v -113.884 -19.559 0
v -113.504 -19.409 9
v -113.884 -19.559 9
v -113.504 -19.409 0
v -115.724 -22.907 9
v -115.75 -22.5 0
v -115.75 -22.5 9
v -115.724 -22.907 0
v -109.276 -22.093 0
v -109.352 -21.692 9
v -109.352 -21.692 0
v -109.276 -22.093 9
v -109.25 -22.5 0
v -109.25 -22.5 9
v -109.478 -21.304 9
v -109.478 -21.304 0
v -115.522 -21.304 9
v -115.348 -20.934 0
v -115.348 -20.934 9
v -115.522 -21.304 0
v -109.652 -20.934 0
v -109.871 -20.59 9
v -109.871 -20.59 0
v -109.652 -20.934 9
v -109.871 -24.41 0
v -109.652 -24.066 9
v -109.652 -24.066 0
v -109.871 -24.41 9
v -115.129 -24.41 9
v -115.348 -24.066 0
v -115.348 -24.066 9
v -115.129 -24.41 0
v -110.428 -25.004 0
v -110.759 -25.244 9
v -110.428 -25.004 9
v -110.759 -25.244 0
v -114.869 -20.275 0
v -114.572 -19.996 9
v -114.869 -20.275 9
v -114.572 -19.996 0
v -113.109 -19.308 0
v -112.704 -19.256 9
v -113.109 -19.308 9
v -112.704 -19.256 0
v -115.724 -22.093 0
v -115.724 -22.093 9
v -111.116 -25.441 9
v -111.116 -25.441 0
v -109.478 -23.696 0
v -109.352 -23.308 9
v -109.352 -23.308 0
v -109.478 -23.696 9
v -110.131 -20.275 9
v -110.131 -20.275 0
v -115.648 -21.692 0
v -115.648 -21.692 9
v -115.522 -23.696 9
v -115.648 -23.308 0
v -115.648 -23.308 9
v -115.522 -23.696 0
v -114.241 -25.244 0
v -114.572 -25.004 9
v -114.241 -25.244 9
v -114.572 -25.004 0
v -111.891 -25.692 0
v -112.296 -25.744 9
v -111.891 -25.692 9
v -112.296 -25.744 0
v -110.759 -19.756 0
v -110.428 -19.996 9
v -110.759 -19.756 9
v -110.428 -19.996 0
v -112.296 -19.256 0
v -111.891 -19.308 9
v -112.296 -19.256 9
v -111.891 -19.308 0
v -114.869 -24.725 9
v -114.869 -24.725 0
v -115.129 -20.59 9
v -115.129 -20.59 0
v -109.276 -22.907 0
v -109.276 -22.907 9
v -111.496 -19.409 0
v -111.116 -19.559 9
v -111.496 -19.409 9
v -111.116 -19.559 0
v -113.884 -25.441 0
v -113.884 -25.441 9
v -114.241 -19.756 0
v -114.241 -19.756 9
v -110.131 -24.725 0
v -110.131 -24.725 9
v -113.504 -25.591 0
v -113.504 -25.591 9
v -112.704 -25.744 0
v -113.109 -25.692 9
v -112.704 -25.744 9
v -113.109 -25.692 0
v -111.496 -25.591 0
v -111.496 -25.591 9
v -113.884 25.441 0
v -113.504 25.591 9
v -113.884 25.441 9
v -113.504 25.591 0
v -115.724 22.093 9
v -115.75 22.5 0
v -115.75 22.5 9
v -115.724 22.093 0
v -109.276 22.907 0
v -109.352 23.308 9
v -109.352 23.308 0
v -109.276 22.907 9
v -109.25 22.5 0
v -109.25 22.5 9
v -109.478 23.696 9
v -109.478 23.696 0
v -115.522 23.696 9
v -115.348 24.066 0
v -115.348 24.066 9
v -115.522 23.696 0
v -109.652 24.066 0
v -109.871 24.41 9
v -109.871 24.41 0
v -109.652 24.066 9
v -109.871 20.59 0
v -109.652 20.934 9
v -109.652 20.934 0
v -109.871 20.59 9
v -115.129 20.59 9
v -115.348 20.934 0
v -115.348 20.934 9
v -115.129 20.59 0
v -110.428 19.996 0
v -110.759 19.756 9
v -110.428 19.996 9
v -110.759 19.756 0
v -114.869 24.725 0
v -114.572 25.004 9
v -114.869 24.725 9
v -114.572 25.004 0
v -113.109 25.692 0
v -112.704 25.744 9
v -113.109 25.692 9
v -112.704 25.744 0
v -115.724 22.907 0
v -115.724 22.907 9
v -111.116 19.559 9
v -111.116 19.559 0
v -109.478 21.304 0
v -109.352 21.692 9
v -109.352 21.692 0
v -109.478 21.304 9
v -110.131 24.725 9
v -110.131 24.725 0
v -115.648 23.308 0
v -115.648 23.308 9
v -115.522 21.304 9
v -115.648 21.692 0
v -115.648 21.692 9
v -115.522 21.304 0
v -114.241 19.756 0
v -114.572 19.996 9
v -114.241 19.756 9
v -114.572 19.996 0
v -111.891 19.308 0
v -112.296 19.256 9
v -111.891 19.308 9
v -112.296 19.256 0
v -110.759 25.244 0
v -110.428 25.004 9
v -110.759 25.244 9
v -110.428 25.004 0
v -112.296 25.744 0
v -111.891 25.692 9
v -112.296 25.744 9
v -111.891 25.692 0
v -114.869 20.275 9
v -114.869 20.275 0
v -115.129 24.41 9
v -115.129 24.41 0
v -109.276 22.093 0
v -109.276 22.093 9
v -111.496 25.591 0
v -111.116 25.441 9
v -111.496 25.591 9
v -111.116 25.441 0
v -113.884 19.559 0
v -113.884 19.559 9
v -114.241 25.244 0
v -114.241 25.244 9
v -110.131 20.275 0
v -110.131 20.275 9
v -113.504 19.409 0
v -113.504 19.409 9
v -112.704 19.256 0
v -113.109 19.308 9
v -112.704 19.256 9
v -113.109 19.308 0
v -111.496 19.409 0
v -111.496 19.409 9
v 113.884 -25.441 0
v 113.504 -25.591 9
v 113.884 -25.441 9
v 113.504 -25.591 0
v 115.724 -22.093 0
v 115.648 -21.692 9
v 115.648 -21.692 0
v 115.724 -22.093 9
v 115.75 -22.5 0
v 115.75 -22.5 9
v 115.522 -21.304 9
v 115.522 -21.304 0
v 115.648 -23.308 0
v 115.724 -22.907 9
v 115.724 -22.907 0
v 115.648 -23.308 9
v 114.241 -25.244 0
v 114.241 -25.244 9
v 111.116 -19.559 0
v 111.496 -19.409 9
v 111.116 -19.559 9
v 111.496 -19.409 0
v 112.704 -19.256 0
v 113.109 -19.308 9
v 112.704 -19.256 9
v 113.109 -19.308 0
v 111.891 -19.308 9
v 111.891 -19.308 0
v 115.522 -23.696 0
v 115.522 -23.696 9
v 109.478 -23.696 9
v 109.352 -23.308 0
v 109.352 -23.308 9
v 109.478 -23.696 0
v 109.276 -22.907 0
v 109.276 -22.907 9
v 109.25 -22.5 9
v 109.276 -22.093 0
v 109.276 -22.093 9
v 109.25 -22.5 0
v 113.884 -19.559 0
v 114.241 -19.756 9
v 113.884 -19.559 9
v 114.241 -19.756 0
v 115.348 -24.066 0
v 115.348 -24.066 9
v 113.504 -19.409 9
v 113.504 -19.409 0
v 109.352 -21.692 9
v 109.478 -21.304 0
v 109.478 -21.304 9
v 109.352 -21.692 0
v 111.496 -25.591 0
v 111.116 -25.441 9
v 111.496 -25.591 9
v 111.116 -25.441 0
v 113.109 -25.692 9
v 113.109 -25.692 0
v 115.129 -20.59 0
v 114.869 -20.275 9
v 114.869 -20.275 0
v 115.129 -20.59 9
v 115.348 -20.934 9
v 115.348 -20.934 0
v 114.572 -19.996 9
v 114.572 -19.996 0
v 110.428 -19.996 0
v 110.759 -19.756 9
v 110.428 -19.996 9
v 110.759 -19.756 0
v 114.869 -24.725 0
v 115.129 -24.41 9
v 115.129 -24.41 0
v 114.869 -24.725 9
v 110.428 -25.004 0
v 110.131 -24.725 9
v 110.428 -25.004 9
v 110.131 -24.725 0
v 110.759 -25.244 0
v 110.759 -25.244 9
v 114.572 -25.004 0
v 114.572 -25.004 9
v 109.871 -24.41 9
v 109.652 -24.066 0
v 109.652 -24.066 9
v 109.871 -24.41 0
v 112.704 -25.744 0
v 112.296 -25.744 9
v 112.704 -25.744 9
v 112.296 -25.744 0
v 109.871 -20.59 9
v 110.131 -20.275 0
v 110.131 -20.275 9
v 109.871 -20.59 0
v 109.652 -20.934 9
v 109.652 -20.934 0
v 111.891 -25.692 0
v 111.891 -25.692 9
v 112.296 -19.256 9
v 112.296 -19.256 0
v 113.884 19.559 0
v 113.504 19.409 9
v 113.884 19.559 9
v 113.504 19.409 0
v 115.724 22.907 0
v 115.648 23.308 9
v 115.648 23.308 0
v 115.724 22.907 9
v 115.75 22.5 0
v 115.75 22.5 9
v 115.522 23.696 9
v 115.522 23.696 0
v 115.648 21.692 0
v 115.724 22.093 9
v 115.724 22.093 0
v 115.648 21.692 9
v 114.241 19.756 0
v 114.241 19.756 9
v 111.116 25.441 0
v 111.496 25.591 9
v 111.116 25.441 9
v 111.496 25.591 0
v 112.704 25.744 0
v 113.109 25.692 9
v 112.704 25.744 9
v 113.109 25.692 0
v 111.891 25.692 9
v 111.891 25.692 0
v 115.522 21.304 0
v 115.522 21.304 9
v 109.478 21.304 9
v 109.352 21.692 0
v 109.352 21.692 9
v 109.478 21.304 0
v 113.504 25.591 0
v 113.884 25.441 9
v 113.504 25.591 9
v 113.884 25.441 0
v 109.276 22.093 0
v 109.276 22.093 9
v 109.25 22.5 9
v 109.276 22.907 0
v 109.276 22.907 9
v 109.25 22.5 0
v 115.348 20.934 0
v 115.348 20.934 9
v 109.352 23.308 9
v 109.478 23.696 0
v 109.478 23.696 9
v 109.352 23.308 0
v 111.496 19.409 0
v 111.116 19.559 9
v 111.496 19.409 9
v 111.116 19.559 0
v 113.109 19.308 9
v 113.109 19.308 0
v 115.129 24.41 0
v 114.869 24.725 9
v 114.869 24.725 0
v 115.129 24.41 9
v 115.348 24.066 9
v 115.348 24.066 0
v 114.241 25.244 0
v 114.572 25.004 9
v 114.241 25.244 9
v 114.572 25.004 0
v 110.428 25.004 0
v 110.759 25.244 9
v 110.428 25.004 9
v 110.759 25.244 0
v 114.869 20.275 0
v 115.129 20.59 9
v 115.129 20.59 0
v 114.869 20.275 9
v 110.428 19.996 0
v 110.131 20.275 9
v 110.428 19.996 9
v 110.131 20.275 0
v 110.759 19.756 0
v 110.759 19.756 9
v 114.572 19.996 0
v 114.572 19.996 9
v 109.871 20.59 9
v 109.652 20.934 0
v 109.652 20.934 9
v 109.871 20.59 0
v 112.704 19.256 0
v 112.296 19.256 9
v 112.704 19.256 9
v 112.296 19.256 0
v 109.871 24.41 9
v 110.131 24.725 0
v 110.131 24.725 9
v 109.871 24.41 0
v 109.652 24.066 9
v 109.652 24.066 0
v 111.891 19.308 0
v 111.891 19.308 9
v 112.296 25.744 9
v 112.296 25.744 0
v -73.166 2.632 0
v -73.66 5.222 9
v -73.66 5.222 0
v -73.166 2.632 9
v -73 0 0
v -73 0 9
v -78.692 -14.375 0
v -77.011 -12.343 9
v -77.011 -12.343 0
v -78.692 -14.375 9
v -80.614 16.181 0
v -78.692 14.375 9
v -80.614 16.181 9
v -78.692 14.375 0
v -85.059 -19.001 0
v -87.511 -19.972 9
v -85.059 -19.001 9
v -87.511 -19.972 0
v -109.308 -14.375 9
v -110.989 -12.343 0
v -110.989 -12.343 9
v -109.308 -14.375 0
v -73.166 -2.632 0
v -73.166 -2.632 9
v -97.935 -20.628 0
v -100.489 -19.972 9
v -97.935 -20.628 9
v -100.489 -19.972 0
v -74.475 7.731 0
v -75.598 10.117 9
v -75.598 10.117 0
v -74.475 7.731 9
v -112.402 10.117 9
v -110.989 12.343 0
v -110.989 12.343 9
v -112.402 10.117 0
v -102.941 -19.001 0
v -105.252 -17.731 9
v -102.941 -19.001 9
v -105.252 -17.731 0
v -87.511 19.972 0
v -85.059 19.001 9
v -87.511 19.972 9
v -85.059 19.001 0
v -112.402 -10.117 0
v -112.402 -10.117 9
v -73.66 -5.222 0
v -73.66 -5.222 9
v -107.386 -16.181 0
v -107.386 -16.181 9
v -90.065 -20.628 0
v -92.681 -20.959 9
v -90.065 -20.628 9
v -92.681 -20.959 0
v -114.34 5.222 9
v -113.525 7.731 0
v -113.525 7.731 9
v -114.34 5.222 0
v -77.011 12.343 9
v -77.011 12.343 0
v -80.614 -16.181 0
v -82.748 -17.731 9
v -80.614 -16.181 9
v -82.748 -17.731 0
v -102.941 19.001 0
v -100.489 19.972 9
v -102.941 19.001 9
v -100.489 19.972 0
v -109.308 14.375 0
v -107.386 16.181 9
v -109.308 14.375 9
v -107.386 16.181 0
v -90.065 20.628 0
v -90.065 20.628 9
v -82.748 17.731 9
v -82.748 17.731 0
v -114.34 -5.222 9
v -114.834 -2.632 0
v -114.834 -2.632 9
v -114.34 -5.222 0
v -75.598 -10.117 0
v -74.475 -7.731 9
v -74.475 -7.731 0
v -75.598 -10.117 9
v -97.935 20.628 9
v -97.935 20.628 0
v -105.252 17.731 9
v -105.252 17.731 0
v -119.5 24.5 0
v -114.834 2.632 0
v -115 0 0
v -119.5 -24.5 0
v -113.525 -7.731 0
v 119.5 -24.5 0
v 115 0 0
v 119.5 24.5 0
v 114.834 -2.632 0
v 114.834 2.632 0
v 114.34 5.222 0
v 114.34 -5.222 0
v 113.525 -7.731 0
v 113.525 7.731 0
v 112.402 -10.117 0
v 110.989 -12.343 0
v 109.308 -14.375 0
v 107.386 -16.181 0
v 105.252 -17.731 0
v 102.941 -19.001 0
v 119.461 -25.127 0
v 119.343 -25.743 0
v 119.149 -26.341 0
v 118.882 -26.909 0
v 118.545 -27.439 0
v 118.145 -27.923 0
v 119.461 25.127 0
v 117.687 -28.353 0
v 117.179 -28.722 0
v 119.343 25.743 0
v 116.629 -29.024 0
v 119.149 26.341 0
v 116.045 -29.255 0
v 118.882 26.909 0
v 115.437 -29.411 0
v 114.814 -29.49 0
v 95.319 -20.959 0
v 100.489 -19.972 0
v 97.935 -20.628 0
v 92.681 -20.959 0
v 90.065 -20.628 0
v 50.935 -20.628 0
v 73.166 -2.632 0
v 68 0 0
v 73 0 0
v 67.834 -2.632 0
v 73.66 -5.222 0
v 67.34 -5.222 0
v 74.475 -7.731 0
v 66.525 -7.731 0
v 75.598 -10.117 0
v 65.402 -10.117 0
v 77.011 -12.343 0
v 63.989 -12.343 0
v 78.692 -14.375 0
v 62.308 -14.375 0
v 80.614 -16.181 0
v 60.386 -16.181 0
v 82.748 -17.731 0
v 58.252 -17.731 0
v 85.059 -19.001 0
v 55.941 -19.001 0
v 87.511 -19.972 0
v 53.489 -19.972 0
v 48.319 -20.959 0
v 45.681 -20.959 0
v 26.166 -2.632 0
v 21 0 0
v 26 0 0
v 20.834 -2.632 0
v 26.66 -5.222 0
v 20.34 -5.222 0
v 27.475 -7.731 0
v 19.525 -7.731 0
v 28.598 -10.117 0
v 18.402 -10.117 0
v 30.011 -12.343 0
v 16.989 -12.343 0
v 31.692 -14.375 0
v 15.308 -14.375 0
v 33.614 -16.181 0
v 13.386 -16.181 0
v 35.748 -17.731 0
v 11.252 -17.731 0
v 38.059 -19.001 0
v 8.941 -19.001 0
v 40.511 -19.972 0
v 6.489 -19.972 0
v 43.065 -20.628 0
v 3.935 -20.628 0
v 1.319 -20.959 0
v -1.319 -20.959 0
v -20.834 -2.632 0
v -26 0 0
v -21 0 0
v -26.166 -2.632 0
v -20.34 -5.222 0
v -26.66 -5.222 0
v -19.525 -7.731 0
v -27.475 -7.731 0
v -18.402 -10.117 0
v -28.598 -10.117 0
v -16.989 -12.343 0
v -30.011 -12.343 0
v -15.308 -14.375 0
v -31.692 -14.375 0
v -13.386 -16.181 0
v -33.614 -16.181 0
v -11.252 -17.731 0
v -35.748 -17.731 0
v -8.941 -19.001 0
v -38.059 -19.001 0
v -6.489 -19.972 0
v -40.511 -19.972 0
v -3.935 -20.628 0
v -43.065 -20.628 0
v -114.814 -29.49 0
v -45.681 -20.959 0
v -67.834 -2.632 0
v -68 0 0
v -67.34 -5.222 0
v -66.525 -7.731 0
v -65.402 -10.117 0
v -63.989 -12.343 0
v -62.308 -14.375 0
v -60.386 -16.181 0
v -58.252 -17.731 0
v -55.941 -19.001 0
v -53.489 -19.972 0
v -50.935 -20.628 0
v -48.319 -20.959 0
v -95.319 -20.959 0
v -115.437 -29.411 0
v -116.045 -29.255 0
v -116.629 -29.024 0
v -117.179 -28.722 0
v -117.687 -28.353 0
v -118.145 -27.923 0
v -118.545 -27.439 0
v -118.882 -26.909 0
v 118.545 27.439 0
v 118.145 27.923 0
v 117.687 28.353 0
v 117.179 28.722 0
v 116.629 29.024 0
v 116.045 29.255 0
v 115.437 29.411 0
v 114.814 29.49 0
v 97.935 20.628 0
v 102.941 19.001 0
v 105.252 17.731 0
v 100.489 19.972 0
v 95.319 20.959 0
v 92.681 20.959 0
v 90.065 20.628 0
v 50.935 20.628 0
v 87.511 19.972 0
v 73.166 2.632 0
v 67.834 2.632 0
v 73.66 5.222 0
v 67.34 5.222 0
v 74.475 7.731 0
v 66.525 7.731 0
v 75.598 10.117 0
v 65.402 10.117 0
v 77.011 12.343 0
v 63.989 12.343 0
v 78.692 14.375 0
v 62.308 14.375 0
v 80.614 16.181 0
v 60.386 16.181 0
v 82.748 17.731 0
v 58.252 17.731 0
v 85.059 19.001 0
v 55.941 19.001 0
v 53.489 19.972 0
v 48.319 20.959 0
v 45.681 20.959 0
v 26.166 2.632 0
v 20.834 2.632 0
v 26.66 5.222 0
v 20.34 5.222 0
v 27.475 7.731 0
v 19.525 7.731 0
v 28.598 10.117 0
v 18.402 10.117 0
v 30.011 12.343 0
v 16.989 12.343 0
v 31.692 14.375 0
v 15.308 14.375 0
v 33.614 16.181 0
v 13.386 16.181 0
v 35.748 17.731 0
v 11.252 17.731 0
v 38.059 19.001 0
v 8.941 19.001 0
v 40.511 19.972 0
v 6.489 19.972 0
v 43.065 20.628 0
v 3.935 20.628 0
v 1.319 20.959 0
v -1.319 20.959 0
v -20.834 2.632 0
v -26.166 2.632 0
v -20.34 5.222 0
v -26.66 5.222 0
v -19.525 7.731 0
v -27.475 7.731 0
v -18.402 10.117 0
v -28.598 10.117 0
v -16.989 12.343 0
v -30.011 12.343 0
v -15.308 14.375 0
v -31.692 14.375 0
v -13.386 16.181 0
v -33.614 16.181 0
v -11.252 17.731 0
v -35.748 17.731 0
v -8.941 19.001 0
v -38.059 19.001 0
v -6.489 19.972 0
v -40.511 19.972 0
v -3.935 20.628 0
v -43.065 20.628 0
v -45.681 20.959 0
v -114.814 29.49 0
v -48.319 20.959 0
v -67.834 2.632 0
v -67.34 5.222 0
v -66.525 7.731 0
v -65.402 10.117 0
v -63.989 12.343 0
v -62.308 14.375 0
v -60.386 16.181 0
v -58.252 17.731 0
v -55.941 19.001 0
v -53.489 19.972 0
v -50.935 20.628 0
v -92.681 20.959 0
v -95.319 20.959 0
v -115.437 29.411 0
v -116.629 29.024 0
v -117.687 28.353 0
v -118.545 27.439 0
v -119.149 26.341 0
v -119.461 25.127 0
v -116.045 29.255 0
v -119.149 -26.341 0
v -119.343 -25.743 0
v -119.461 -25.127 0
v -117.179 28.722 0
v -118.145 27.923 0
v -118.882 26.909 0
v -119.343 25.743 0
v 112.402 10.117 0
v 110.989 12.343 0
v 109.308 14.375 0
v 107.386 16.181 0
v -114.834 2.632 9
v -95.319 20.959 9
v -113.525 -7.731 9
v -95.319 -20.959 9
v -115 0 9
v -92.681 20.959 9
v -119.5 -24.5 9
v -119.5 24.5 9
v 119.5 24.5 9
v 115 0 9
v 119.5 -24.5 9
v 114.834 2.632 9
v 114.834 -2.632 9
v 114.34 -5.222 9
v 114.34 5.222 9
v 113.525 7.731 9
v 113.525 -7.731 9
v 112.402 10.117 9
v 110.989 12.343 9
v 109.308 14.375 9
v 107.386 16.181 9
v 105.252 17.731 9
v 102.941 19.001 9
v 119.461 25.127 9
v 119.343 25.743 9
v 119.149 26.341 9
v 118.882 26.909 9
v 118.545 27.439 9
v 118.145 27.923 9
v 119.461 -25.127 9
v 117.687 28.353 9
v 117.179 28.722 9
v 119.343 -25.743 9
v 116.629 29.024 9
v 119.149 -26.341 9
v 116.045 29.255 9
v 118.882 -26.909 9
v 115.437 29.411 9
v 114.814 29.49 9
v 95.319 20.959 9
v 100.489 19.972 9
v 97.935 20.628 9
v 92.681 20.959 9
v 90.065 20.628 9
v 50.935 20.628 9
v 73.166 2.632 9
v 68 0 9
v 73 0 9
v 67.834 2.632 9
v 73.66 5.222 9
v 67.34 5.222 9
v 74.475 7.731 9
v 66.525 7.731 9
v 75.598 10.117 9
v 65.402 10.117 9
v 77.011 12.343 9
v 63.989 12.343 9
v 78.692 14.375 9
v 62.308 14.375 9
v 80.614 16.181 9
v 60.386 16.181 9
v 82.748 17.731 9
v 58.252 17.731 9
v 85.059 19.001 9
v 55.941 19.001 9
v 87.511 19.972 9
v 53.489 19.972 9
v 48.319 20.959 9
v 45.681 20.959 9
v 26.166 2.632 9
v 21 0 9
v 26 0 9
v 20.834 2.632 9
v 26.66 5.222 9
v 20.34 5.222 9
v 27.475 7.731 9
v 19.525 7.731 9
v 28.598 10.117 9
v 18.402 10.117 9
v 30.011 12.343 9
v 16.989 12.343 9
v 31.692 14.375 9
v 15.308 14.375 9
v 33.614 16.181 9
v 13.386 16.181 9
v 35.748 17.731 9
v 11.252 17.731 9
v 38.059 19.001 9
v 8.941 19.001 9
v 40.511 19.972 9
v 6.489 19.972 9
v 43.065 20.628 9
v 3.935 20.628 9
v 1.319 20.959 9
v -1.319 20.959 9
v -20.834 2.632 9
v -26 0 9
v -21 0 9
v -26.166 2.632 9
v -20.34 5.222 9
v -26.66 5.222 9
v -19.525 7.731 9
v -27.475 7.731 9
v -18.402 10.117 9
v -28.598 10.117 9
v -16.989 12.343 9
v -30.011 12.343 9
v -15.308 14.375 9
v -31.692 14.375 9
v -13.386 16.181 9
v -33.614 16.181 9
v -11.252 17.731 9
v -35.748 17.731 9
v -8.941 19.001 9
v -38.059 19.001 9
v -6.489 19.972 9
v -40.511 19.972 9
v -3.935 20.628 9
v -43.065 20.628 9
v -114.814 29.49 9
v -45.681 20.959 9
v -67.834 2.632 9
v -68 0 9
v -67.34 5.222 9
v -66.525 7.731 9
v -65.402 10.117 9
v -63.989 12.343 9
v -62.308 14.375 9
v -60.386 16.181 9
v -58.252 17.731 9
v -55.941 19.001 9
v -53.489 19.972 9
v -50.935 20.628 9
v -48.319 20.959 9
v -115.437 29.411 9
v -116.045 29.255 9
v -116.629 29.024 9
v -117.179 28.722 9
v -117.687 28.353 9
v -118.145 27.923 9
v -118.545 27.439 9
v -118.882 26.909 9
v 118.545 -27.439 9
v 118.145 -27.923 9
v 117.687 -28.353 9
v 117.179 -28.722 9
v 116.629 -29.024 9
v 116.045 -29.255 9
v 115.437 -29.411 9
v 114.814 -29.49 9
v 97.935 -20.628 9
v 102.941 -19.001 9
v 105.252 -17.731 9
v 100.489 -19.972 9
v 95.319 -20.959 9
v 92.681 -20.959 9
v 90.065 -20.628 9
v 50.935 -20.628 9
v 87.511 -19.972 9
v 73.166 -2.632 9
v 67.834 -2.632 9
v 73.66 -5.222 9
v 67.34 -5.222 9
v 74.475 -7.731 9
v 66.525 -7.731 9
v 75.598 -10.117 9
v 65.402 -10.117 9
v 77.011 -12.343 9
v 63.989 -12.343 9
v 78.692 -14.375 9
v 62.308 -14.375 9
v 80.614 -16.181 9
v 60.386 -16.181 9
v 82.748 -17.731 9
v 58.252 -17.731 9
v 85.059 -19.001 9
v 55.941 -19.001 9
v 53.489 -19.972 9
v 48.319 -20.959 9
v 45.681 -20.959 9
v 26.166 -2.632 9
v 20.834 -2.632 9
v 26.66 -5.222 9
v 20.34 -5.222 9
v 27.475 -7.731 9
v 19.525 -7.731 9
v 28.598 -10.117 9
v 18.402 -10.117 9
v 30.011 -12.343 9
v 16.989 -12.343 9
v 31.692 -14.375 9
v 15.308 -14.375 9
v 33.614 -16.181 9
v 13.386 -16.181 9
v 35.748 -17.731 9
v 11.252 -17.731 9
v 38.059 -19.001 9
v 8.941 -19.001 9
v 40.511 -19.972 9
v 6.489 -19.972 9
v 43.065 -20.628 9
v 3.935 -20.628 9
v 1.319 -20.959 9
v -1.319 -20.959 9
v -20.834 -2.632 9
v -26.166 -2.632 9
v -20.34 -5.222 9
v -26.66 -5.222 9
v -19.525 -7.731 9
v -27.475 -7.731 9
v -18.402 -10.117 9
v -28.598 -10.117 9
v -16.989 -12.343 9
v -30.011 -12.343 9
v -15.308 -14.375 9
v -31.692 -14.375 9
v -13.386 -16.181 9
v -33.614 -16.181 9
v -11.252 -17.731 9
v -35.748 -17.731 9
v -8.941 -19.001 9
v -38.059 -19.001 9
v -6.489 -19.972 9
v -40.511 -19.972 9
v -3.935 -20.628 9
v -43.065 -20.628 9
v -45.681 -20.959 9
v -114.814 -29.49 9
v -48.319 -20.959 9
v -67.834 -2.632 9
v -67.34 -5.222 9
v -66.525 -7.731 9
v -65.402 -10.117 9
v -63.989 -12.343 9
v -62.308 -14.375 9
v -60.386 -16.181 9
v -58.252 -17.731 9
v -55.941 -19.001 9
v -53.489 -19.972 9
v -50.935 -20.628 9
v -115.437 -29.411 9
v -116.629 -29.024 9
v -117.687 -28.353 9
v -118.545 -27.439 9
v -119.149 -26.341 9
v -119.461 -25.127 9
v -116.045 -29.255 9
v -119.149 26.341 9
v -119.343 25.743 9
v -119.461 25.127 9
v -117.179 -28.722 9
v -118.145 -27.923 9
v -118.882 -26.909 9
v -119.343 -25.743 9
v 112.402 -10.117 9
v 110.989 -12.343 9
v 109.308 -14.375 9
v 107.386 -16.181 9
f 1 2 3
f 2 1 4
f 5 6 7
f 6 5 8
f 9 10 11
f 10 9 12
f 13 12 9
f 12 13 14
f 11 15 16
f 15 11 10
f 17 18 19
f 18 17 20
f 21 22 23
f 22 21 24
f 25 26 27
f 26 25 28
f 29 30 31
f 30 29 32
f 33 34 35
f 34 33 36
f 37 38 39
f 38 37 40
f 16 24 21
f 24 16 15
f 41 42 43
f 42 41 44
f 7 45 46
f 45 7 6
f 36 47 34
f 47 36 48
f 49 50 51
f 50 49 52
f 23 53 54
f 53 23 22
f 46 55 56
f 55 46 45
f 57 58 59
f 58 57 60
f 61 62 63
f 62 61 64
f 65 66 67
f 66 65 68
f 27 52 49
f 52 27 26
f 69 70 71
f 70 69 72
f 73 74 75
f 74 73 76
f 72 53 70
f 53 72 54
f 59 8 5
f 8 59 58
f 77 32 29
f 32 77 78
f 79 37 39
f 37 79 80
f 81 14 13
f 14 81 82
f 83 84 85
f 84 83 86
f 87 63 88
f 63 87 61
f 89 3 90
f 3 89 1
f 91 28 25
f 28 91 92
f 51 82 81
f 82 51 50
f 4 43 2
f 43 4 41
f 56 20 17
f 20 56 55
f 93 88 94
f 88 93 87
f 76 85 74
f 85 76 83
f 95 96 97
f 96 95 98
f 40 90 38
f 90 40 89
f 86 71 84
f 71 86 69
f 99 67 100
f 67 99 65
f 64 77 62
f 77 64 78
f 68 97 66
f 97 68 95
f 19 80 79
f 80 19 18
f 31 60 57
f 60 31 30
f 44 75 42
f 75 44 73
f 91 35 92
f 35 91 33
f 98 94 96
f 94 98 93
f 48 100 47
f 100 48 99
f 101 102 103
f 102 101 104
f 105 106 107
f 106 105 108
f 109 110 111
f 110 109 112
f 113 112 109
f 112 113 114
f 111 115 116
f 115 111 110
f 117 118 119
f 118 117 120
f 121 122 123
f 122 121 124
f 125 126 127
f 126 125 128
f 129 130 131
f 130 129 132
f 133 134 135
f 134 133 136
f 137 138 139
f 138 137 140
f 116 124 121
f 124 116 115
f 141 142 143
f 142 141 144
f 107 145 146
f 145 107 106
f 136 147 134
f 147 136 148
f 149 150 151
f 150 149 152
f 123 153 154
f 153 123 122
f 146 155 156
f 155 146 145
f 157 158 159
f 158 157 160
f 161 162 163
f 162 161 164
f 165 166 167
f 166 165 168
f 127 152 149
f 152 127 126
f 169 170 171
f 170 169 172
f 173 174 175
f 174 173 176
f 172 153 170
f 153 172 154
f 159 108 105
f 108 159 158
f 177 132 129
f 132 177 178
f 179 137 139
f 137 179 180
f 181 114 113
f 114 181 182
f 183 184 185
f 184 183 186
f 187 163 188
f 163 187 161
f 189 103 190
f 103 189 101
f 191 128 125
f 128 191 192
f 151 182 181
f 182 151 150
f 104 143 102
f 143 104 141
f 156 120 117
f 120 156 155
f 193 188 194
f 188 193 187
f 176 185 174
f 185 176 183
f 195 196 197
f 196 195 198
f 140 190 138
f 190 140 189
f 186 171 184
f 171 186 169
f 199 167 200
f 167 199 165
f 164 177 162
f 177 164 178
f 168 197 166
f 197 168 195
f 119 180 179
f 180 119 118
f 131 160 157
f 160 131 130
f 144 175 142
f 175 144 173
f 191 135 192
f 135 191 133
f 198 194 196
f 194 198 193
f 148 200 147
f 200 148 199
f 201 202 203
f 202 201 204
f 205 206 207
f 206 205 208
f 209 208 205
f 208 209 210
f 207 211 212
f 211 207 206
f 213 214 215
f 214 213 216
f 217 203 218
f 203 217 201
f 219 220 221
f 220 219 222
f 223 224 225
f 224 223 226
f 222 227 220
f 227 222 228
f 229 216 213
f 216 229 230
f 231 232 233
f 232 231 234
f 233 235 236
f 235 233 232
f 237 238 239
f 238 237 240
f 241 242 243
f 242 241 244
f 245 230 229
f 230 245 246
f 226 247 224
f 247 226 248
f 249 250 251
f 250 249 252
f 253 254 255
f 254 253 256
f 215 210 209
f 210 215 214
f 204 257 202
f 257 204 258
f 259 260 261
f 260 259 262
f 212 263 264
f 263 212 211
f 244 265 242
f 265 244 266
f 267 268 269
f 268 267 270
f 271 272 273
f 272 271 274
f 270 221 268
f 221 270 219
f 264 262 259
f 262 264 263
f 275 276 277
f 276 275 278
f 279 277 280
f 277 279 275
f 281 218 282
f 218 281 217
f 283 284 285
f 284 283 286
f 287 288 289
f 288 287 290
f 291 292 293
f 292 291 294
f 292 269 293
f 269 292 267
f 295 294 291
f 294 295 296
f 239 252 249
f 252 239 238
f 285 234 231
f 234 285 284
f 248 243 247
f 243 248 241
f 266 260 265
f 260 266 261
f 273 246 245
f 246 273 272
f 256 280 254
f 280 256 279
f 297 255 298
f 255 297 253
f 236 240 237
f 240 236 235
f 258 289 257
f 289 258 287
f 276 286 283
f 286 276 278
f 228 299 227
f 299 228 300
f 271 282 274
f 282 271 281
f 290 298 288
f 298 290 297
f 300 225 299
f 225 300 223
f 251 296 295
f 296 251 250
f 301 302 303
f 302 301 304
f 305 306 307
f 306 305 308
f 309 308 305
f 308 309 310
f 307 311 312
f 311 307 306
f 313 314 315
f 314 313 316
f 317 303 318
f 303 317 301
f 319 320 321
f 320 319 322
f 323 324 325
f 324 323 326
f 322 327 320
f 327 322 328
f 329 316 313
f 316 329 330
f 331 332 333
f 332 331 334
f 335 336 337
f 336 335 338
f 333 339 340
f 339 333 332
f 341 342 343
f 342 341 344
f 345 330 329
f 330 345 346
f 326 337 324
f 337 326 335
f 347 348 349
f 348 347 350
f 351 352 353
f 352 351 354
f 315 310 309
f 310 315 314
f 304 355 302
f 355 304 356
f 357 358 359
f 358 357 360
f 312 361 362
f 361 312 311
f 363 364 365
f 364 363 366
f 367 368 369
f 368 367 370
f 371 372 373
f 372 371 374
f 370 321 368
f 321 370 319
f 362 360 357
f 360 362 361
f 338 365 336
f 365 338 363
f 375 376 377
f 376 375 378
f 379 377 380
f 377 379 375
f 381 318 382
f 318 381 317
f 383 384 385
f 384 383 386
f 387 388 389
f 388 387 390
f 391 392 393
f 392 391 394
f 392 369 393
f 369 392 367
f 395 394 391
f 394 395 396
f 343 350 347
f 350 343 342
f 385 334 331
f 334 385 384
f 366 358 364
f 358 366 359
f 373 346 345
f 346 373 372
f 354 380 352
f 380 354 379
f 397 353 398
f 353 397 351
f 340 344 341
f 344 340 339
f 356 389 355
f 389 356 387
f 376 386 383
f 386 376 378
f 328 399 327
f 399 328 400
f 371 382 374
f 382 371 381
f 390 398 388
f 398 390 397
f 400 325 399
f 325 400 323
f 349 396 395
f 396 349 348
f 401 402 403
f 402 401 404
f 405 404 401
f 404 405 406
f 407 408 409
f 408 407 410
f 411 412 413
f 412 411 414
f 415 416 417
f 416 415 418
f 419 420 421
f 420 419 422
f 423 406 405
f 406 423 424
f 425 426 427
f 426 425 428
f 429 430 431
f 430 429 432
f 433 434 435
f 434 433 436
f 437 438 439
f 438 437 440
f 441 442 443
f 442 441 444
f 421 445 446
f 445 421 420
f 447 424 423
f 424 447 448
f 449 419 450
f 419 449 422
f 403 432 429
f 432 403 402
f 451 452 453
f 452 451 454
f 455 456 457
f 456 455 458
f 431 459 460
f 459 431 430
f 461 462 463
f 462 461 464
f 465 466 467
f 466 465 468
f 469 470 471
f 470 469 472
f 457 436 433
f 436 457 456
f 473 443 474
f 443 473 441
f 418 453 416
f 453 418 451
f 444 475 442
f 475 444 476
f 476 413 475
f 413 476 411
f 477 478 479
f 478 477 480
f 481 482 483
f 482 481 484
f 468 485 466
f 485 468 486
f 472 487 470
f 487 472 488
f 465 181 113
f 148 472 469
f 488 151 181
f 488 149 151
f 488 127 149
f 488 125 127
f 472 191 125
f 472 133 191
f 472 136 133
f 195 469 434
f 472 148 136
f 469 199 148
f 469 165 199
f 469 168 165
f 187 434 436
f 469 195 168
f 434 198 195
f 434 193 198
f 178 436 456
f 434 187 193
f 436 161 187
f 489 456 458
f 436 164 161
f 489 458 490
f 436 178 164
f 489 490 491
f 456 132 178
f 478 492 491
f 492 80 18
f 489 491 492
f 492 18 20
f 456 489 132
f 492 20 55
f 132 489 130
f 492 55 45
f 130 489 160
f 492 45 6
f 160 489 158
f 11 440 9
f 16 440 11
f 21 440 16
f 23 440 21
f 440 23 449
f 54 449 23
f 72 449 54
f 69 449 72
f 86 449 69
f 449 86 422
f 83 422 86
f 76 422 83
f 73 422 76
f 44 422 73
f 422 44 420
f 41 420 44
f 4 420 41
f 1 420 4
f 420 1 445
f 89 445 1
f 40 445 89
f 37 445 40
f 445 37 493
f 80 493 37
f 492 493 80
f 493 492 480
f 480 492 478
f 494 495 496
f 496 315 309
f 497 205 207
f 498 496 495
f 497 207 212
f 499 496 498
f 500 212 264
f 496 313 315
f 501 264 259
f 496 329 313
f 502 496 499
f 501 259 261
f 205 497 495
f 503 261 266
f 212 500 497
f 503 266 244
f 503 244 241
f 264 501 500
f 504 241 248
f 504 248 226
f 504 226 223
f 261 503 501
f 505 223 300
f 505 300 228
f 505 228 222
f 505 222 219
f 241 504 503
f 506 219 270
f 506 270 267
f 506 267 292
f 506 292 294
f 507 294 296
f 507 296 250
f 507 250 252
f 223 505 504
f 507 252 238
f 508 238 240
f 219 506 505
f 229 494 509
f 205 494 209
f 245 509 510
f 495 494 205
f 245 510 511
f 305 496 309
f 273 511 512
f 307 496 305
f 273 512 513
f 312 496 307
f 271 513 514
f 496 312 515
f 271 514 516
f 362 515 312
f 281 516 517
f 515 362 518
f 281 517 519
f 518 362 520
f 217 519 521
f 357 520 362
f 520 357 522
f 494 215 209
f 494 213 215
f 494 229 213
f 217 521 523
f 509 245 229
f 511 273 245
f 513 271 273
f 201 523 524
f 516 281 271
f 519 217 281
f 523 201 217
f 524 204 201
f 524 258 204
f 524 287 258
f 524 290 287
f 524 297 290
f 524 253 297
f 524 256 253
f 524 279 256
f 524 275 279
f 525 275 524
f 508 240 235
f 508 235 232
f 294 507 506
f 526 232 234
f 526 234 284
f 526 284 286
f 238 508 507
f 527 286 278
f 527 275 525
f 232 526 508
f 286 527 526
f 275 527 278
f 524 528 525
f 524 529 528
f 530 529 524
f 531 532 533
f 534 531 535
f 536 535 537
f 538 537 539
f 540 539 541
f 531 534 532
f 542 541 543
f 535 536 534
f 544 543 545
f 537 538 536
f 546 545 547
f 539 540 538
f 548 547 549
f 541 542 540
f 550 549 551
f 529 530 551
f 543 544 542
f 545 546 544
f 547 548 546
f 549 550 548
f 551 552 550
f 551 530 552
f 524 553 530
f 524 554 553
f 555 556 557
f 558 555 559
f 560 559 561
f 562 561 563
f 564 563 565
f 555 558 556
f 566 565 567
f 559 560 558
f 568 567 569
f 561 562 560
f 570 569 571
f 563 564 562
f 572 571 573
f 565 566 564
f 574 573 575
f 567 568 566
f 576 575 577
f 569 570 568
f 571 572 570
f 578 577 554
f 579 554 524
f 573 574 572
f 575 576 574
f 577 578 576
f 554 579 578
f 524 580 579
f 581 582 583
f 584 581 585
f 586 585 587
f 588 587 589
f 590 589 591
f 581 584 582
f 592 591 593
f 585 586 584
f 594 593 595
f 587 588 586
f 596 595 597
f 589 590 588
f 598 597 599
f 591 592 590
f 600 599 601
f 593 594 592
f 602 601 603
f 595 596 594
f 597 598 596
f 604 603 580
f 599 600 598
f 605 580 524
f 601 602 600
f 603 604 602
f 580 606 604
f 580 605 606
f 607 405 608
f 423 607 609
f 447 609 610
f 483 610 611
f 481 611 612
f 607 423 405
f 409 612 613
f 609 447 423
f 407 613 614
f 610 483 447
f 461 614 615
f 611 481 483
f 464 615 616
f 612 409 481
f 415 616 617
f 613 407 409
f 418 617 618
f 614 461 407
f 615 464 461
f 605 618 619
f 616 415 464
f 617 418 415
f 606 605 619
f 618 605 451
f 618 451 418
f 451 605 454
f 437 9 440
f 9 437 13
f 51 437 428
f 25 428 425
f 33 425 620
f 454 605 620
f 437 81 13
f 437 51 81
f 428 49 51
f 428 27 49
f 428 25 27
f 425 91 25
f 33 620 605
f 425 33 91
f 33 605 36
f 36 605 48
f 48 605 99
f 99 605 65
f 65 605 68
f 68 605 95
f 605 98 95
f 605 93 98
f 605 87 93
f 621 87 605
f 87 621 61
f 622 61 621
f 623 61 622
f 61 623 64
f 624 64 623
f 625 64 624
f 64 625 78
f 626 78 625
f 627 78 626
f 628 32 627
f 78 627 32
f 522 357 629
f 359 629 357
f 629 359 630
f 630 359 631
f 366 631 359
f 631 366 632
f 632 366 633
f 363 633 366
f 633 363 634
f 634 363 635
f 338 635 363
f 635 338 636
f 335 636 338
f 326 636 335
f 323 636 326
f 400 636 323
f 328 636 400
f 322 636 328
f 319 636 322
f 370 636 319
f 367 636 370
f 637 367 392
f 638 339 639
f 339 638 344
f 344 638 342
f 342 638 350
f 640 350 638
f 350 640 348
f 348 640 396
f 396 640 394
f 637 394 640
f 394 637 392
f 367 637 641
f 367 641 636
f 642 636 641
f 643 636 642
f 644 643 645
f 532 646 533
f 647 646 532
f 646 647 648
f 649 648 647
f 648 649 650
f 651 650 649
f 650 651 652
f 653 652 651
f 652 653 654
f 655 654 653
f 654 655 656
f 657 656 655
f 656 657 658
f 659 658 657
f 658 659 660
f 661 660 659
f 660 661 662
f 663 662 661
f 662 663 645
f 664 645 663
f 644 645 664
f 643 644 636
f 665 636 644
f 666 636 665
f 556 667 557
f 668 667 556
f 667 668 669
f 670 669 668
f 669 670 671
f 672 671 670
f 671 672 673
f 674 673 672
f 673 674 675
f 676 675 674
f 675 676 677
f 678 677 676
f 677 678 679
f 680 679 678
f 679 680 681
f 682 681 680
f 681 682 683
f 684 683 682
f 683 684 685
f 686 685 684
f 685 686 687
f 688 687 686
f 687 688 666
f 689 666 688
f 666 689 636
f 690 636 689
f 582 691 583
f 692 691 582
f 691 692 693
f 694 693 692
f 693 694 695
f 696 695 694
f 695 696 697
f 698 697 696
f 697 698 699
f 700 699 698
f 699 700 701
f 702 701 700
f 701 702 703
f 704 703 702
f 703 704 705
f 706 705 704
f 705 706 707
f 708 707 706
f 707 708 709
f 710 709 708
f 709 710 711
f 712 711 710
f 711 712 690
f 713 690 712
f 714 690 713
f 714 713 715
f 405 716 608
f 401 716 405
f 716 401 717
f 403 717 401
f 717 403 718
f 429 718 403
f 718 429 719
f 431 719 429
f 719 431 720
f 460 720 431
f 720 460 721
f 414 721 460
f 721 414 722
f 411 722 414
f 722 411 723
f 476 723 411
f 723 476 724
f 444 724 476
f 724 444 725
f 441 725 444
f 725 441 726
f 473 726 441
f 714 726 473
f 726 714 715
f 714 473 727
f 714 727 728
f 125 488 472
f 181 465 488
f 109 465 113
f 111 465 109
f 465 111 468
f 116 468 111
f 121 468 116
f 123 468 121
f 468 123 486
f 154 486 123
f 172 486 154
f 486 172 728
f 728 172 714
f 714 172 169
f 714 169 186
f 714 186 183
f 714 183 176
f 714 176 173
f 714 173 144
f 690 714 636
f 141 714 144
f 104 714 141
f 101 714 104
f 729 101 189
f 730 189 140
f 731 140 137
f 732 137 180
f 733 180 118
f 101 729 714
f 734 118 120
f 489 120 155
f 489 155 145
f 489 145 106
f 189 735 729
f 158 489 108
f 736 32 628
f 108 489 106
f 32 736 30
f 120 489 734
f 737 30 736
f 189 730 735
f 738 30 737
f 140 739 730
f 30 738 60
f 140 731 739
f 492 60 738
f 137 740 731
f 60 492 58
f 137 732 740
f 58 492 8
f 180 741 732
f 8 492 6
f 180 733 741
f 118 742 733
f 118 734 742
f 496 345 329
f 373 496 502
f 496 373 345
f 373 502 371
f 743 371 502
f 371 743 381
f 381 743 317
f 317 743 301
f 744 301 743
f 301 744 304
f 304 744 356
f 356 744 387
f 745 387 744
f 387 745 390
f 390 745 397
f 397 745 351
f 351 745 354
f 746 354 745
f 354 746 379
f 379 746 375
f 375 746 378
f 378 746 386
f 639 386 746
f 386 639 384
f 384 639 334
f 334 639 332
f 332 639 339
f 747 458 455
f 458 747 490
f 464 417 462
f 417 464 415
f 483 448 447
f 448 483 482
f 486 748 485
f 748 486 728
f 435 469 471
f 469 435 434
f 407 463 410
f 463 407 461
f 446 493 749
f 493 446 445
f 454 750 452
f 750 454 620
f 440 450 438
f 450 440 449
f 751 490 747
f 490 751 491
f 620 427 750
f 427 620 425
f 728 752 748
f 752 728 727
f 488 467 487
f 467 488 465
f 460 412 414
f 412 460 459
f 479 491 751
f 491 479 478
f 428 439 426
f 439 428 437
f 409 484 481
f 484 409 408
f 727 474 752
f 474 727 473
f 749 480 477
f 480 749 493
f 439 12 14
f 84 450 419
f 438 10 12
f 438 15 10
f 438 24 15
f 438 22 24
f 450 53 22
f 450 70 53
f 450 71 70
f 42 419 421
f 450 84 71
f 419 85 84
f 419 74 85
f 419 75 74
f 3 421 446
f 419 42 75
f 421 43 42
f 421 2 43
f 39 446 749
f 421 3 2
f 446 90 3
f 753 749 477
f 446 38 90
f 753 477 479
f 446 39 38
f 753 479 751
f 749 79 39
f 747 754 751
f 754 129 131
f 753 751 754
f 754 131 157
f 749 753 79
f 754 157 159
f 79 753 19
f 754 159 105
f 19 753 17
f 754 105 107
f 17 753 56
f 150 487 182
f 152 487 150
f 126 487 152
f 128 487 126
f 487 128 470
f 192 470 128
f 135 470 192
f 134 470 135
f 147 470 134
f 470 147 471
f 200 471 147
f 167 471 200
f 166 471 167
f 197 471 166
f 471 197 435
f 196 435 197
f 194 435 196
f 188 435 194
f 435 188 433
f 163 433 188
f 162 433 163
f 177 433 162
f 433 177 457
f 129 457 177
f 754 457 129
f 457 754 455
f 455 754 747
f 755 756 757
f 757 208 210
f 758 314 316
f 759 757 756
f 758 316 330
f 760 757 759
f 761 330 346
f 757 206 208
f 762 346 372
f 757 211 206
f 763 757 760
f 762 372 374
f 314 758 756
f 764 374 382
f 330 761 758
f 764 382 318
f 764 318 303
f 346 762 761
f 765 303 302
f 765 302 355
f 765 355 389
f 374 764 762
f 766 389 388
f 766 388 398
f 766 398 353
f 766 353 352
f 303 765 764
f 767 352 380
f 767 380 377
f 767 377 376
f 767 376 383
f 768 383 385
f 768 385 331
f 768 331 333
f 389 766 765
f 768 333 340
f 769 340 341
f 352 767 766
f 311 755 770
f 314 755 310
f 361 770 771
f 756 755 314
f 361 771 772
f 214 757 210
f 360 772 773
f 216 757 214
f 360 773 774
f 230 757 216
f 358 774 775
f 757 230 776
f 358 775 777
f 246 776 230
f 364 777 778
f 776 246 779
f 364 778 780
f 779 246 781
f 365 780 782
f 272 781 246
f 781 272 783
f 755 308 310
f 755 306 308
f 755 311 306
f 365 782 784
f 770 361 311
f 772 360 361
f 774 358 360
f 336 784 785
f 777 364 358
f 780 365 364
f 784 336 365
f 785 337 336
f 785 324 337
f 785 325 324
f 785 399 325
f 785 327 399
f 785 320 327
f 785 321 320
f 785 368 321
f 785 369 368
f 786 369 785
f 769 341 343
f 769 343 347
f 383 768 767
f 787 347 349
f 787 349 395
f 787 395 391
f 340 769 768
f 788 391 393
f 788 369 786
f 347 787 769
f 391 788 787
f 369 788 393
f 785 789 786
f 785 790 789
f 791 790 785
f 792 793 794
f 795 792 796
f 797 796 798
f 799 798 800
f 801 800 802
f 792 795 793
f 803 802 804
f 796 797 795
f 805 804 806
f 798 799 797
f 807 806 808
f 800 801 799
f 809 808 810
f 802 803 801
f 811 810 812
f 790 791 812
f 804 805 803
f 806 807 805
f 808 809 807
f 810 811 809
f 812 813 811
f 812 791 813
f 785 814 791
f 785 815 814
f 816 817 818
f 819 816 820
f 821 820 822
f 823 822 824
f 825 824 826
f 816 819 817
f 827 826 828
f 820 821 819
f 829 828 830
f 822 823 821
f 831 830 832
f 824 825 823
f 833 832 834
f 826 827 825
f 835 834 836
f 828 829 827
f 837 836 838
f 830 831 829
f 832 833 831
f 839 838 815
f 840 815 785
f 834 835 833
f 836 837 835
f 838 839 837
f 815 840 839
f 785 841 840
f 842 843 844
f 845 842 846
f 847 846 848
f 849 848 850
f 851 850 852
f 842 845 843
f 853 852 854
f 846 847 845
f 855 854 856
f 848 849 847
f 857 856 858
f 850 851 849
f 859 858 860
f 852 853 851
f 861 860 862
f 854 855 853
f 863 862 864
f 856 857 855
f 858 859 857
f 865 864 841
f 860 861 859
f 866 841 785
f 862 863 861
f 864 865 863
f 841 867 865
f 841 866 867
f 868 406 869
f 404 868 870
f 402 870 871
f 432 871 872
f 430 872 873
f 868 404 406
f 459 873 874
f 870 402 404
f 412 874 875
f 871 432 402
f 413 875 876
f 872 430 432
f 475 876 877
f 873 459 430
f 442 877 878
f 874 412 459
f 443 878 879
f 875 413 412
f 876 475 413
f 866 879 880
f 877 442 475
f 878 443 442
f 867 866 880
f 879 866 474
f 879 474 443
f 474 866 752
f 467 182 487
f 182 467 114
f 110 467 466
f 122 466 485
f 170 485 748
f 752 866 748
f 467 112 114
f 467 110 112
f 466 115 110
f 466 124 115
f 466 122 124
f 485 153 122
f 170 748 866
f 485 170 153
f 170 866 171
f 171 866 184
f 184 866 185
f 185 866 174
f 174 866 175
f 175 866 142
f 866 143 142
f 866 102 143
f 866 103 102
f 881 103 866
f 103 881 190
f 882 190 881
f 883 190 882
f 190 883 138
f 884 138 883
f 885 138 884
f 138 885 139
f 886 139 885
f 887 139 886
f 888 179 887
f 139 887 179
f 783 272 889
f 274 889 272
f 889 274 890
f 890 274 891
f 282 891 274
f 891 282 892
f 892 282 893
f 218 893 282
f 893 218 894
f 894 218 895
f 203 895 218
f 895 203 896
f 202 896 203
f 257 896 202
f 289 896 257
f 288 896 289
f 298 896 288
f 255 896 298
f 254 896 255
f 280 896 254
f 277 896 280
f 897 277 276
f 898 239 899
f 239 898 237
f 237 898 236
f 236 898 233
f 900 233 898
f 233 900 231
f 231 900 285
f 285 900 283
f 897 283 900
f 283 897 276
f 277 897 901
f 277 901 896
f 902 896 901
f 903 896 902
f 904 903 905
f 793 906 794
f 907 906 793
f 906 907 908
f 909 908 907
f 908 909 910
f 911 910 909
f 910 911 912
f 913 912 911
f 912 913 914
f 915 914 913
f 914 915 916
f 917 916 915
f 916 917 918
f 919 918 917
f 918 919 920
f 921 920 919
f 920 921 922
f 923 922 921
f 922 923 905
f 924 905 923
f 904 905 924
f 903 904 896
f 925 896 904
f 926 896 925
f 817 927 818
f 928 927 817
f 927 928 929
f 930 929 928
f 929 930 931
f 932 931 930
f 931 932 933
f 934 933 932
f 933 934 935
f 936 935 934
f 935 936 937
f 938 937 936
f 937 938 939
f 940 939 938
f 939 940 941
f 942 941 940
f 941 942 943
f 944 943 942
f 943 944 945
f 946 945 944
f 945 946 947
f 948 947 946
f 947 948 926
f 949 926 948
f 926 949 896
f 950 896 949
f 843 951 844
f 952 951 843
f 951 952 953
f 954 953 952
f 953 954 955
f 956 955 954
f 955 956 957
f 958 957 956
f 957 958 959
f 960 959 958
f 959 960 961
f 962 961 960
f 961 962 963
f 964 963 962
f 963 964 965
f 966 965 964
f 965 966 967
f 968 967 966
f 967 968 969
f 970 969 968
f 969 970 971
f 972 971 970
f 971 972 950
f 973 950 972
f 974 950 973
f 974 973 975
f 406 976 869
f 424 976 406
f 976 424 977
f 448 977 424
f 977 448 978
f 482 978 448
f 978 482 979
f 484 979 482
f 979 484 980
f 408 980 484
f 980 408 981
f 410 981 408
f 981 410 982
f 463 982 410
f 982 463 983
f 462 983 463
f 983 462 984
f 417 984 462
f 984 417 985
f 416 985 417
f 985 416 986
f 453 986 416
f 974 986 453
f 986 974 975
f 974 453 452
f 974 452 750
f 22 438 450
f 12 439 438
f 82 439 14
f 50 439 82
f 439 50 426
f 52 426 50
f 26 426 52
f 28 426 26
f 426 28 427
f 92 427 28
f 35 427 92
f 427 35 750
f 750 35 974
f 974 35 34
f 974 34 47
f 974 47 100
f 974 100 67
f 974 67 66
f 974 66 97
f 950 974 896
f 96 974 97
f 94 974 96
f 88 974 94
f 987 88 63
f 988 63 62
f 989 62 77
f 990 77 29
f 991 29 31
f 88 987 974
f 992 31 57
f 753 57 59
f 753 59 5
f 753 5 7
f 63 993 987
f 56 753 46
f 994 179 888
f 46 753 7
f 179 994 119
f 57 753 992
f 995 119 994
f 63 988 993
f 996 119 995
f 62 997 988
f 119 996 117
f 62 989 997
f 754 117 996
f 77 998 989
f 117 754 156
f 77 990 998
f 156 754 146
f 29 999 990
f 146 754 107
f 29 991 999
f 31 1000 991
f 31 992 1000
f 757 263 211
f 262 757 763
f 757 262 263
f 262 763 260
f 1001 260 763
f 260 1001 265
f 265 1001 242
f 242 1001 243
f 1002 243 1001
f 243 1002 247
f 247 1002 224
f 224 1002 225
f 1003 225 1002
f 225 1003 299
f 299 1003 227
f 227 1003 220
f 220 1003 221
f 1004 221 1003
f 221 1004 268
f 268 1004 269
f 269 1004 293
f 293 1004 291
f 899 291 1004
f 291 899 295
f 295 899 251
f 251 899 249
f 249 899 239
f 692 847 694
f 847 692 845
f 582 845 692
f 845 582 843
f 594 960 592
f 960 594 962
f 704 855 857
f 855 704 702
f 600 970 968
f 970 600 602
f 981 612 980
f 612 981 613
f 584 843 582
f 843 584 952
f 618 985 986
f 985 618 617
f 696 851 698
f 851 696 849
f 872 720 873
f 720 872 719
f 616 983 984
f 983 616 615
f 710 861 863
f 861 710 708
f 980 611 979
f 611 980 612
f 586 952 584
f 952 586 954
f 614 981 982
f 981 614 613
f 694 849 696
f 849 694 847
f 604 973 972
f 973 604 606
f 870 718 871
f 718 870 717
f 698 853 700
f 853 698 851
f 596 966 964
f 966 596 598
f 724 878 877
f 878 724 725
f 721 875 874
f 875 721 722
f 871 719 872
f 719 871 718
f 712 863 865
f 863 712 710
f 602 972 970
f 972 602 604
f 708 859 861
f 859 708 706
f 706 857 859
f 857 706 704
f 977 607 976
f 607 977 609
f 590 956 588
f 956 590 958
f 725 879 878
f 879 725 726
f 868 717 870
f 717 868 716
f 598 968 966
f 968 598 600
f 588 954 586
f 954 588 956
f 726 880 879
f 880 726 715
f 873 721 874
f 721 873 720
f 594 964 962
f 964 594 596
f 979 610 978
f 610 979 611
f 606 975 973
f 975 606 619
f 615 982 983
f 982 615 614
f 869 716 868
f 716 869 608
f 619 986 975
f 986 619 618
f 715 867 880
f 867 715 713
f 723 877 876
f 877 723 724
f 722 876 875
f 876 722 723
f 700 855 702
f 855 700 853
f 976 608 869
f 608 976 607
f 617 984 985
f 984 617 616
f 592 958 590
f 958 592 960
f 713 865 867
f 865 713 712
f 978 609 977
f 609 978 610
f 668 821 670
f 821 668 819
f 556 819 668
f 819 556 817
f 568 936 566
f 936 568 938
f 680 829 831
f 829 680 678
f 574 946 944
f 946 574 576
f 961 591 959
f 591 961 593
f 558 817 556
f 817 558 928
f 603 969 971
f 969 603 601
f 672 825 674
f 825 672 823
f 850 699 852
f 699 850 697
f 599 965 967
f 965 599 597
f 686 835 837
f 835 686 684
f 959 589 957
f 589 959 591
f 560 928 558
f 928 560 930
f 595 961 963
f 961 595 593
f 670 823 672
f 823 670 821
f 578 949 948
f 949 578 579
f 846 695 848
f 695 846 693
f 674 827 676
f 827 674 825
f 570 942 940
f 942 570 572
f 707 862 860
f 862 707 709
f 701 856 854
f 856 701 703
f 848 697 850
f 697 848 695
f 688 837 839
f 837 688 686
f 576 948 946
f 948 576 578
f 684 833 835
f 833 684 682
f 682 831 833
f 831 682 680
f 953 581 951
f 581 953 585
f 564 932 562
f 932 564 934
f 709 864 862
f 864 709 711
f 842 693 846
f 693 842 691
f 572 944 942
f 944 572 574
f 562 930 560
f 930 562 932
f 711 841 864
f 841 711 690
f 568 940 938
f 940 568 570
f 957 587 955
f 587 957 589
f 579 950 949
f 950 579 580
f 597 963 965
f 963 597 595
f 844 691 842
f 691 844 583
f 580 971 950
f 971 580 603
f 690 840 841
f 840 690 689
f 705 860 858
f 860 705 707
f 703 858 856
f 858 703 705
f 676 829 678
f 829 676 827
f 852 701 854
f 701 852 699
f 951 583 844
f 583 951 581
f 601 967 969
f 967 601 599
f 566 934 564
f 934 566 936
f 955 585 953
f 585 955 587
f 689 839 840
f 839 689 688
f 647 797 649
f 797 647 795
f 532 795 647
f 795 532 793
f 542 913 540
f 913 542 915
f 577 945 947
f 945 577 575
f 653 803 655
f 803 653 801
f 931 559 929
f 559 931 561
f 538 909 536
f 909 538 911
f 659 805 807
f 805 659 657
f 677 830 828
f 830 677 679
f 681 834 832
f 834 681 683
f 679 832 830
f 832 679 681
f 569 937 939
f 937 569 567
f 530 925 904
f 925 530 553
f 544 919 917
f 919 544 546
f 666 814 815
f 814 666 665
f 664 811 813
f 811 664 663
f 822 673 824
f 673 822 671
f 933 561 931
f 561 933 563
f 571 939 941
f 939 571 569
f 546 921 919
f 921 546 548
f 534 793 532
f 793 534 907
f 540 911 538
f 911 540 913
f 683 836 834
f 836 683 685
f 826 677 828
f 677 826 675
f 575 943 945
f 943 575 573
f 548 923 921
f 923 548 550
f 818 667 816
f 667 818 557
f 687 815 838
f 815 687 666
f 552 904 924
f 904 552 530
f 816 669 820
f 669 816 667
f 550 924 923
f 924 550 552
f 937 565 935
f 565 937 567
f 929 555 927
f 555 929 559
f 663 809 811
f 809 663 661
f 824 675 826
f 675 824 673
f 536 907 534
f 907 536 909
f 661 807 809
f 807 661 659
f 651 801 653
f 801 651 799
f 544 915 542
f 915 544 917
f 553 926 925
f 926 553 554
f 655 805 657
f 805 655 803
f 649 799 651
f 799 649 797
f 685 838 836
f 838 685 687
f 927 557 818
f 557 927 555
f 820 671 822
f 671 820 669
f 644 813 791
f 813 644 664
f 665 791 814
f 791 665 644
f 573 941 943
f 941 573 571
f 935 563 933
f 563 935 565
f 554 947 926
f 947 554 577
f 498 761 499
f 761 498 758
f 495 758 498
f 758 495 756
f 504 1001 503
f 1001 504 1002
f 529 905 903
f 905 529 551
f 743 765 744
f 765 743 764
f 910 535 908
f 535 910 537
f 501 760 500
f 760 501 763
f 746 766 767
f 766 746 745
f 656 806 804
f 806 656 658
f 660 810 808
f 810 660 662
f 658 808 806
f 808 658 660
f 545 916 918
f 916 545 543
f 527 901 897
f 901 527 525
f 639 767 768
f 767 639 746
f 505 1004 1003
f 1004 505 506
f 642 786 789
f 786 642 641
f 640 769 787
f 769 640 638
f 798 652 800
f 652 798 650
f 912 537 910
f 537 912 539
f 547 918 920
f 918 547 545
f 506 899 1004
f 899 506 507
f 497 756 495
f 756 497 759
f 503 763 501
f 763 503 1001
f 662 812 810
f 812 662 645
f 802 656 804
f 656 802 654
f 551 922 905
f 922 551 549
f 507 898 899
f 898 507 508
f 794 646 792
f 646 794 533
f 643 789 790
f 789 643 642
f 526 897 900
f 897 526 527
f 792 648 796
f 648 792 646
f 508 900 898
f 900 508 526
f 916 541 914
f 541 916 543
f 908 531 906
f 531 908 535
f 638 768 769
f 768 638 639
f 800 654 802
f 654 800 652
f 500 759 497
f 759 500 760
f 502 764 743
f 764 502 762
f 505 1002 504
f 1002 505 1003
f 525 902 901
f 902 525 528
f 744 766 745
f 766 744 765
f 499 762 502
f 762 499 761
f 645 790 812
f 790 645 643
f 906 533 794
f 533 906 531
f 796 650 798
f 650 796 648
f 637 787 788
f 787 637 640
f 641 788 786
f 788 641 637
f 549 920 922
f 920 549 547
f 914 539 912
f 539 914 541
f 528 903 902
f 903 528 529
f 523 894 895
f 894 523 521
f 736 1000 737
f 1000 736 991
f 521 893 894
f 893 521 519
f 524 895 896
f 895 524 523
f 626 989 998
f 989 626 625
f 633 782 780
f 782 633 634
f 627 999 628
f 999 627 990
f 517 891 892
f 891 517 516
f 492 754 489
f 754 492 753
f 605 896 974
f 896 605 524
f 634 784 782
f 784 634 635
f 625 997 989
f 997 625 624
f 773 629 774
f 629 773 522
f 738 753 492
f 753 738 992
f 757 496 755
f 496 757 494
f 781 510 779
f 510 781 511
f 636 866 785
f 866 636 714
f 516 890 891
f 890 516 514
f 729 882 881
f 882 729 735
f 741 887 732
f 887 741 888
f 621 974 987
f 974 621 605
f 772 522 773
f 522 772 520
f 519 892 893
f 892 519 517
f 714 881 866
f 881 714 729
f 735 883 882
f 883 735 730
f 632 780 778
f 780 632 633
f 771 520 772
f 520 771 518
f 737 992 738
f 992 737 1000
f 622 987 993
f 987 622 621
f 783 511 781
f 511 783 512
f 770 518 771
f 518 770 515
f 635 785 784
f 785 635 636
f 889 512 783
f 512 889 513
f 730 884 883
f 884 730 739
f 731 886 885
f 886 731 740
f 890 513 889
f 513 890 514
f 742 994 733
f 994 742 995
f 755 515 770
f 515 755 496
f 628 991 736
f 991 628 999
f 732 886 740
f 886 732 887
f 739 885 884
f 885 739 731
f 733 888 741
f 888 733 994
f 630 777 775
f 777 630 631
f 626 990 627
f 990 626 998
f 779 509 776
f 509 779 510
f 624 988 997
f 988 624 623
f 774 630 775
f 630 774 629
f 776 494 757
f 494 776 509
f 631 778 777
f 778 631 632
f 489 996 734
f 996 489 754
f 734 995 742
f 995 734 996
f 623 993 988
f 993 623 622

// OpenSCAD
$fn = 50;

difference() {
	union() {
		hull() {
			translate(v = [-114.5, 24.5, 0]) {
				cylinder(h = 9, r = 5);
			}
			translate(v = [114.5, 24.5, 0]) {
				cylinder(h = 9, r = 5);
			}
			translate(v = [-114.5, -24.5, 0]) {
				cylinder(h = 9, r = 5);
			}
			translate(v = [114.5, -24.5, 0]) {
				cylinder(h = 9, r = 5);
			}
		}
	}
	union() {
		translate(v = [-112.5, -22.5, -100.0]) {
			cylinder(h = 200, r = 3.25);
		}
		translate(v = [-112.5, 22.5, -100.0]) {
			cylinder(h = 200, r = 3.25);
		}
		translate(v = [112.5, -22.5, -100.0]) {
			cylinder(h = 200, r = 3.25);
		}
		translate(v = [112.5, 22.5, -100.0]) {
			cylinder(h = 200, r = 3.25);
		}
		translate(v = [-112.5, -22.5, -100.0]) {
			cylinder(h = 200, r = 1.8);
		}
		translate(v = [-112.5, 22.5, -100.0]) {
			cylinder(h = 200, r = 1.8);
		}
		translate(v = [112.5, -22.5, -100.0]) {
			cylinder(h = 200, r = 1.8);
		}
		translate(v = [112.5, 22.5, -100.0]) {
			cylinder(h = 200, r = 1.8);
		}
		translate(v = [-94.0, 0, 0.0]) {
			cylinder(h = 9, r = 21.0);
		}
		translate(v = [-47.0, 0, 0.0]) {
			cylinder(h = 9, r = 21.0);
		}
		cylinder(h = 9, r = 21.0);
		translate(v = [47.0, 0, 0.0]) {
			cylinder(h = 9, r = 21.0);
		}
		translate(v = [94.0, 0, 0.0]) {
			cylinder(h = 9, r = 21.0);
		}
	}
}
